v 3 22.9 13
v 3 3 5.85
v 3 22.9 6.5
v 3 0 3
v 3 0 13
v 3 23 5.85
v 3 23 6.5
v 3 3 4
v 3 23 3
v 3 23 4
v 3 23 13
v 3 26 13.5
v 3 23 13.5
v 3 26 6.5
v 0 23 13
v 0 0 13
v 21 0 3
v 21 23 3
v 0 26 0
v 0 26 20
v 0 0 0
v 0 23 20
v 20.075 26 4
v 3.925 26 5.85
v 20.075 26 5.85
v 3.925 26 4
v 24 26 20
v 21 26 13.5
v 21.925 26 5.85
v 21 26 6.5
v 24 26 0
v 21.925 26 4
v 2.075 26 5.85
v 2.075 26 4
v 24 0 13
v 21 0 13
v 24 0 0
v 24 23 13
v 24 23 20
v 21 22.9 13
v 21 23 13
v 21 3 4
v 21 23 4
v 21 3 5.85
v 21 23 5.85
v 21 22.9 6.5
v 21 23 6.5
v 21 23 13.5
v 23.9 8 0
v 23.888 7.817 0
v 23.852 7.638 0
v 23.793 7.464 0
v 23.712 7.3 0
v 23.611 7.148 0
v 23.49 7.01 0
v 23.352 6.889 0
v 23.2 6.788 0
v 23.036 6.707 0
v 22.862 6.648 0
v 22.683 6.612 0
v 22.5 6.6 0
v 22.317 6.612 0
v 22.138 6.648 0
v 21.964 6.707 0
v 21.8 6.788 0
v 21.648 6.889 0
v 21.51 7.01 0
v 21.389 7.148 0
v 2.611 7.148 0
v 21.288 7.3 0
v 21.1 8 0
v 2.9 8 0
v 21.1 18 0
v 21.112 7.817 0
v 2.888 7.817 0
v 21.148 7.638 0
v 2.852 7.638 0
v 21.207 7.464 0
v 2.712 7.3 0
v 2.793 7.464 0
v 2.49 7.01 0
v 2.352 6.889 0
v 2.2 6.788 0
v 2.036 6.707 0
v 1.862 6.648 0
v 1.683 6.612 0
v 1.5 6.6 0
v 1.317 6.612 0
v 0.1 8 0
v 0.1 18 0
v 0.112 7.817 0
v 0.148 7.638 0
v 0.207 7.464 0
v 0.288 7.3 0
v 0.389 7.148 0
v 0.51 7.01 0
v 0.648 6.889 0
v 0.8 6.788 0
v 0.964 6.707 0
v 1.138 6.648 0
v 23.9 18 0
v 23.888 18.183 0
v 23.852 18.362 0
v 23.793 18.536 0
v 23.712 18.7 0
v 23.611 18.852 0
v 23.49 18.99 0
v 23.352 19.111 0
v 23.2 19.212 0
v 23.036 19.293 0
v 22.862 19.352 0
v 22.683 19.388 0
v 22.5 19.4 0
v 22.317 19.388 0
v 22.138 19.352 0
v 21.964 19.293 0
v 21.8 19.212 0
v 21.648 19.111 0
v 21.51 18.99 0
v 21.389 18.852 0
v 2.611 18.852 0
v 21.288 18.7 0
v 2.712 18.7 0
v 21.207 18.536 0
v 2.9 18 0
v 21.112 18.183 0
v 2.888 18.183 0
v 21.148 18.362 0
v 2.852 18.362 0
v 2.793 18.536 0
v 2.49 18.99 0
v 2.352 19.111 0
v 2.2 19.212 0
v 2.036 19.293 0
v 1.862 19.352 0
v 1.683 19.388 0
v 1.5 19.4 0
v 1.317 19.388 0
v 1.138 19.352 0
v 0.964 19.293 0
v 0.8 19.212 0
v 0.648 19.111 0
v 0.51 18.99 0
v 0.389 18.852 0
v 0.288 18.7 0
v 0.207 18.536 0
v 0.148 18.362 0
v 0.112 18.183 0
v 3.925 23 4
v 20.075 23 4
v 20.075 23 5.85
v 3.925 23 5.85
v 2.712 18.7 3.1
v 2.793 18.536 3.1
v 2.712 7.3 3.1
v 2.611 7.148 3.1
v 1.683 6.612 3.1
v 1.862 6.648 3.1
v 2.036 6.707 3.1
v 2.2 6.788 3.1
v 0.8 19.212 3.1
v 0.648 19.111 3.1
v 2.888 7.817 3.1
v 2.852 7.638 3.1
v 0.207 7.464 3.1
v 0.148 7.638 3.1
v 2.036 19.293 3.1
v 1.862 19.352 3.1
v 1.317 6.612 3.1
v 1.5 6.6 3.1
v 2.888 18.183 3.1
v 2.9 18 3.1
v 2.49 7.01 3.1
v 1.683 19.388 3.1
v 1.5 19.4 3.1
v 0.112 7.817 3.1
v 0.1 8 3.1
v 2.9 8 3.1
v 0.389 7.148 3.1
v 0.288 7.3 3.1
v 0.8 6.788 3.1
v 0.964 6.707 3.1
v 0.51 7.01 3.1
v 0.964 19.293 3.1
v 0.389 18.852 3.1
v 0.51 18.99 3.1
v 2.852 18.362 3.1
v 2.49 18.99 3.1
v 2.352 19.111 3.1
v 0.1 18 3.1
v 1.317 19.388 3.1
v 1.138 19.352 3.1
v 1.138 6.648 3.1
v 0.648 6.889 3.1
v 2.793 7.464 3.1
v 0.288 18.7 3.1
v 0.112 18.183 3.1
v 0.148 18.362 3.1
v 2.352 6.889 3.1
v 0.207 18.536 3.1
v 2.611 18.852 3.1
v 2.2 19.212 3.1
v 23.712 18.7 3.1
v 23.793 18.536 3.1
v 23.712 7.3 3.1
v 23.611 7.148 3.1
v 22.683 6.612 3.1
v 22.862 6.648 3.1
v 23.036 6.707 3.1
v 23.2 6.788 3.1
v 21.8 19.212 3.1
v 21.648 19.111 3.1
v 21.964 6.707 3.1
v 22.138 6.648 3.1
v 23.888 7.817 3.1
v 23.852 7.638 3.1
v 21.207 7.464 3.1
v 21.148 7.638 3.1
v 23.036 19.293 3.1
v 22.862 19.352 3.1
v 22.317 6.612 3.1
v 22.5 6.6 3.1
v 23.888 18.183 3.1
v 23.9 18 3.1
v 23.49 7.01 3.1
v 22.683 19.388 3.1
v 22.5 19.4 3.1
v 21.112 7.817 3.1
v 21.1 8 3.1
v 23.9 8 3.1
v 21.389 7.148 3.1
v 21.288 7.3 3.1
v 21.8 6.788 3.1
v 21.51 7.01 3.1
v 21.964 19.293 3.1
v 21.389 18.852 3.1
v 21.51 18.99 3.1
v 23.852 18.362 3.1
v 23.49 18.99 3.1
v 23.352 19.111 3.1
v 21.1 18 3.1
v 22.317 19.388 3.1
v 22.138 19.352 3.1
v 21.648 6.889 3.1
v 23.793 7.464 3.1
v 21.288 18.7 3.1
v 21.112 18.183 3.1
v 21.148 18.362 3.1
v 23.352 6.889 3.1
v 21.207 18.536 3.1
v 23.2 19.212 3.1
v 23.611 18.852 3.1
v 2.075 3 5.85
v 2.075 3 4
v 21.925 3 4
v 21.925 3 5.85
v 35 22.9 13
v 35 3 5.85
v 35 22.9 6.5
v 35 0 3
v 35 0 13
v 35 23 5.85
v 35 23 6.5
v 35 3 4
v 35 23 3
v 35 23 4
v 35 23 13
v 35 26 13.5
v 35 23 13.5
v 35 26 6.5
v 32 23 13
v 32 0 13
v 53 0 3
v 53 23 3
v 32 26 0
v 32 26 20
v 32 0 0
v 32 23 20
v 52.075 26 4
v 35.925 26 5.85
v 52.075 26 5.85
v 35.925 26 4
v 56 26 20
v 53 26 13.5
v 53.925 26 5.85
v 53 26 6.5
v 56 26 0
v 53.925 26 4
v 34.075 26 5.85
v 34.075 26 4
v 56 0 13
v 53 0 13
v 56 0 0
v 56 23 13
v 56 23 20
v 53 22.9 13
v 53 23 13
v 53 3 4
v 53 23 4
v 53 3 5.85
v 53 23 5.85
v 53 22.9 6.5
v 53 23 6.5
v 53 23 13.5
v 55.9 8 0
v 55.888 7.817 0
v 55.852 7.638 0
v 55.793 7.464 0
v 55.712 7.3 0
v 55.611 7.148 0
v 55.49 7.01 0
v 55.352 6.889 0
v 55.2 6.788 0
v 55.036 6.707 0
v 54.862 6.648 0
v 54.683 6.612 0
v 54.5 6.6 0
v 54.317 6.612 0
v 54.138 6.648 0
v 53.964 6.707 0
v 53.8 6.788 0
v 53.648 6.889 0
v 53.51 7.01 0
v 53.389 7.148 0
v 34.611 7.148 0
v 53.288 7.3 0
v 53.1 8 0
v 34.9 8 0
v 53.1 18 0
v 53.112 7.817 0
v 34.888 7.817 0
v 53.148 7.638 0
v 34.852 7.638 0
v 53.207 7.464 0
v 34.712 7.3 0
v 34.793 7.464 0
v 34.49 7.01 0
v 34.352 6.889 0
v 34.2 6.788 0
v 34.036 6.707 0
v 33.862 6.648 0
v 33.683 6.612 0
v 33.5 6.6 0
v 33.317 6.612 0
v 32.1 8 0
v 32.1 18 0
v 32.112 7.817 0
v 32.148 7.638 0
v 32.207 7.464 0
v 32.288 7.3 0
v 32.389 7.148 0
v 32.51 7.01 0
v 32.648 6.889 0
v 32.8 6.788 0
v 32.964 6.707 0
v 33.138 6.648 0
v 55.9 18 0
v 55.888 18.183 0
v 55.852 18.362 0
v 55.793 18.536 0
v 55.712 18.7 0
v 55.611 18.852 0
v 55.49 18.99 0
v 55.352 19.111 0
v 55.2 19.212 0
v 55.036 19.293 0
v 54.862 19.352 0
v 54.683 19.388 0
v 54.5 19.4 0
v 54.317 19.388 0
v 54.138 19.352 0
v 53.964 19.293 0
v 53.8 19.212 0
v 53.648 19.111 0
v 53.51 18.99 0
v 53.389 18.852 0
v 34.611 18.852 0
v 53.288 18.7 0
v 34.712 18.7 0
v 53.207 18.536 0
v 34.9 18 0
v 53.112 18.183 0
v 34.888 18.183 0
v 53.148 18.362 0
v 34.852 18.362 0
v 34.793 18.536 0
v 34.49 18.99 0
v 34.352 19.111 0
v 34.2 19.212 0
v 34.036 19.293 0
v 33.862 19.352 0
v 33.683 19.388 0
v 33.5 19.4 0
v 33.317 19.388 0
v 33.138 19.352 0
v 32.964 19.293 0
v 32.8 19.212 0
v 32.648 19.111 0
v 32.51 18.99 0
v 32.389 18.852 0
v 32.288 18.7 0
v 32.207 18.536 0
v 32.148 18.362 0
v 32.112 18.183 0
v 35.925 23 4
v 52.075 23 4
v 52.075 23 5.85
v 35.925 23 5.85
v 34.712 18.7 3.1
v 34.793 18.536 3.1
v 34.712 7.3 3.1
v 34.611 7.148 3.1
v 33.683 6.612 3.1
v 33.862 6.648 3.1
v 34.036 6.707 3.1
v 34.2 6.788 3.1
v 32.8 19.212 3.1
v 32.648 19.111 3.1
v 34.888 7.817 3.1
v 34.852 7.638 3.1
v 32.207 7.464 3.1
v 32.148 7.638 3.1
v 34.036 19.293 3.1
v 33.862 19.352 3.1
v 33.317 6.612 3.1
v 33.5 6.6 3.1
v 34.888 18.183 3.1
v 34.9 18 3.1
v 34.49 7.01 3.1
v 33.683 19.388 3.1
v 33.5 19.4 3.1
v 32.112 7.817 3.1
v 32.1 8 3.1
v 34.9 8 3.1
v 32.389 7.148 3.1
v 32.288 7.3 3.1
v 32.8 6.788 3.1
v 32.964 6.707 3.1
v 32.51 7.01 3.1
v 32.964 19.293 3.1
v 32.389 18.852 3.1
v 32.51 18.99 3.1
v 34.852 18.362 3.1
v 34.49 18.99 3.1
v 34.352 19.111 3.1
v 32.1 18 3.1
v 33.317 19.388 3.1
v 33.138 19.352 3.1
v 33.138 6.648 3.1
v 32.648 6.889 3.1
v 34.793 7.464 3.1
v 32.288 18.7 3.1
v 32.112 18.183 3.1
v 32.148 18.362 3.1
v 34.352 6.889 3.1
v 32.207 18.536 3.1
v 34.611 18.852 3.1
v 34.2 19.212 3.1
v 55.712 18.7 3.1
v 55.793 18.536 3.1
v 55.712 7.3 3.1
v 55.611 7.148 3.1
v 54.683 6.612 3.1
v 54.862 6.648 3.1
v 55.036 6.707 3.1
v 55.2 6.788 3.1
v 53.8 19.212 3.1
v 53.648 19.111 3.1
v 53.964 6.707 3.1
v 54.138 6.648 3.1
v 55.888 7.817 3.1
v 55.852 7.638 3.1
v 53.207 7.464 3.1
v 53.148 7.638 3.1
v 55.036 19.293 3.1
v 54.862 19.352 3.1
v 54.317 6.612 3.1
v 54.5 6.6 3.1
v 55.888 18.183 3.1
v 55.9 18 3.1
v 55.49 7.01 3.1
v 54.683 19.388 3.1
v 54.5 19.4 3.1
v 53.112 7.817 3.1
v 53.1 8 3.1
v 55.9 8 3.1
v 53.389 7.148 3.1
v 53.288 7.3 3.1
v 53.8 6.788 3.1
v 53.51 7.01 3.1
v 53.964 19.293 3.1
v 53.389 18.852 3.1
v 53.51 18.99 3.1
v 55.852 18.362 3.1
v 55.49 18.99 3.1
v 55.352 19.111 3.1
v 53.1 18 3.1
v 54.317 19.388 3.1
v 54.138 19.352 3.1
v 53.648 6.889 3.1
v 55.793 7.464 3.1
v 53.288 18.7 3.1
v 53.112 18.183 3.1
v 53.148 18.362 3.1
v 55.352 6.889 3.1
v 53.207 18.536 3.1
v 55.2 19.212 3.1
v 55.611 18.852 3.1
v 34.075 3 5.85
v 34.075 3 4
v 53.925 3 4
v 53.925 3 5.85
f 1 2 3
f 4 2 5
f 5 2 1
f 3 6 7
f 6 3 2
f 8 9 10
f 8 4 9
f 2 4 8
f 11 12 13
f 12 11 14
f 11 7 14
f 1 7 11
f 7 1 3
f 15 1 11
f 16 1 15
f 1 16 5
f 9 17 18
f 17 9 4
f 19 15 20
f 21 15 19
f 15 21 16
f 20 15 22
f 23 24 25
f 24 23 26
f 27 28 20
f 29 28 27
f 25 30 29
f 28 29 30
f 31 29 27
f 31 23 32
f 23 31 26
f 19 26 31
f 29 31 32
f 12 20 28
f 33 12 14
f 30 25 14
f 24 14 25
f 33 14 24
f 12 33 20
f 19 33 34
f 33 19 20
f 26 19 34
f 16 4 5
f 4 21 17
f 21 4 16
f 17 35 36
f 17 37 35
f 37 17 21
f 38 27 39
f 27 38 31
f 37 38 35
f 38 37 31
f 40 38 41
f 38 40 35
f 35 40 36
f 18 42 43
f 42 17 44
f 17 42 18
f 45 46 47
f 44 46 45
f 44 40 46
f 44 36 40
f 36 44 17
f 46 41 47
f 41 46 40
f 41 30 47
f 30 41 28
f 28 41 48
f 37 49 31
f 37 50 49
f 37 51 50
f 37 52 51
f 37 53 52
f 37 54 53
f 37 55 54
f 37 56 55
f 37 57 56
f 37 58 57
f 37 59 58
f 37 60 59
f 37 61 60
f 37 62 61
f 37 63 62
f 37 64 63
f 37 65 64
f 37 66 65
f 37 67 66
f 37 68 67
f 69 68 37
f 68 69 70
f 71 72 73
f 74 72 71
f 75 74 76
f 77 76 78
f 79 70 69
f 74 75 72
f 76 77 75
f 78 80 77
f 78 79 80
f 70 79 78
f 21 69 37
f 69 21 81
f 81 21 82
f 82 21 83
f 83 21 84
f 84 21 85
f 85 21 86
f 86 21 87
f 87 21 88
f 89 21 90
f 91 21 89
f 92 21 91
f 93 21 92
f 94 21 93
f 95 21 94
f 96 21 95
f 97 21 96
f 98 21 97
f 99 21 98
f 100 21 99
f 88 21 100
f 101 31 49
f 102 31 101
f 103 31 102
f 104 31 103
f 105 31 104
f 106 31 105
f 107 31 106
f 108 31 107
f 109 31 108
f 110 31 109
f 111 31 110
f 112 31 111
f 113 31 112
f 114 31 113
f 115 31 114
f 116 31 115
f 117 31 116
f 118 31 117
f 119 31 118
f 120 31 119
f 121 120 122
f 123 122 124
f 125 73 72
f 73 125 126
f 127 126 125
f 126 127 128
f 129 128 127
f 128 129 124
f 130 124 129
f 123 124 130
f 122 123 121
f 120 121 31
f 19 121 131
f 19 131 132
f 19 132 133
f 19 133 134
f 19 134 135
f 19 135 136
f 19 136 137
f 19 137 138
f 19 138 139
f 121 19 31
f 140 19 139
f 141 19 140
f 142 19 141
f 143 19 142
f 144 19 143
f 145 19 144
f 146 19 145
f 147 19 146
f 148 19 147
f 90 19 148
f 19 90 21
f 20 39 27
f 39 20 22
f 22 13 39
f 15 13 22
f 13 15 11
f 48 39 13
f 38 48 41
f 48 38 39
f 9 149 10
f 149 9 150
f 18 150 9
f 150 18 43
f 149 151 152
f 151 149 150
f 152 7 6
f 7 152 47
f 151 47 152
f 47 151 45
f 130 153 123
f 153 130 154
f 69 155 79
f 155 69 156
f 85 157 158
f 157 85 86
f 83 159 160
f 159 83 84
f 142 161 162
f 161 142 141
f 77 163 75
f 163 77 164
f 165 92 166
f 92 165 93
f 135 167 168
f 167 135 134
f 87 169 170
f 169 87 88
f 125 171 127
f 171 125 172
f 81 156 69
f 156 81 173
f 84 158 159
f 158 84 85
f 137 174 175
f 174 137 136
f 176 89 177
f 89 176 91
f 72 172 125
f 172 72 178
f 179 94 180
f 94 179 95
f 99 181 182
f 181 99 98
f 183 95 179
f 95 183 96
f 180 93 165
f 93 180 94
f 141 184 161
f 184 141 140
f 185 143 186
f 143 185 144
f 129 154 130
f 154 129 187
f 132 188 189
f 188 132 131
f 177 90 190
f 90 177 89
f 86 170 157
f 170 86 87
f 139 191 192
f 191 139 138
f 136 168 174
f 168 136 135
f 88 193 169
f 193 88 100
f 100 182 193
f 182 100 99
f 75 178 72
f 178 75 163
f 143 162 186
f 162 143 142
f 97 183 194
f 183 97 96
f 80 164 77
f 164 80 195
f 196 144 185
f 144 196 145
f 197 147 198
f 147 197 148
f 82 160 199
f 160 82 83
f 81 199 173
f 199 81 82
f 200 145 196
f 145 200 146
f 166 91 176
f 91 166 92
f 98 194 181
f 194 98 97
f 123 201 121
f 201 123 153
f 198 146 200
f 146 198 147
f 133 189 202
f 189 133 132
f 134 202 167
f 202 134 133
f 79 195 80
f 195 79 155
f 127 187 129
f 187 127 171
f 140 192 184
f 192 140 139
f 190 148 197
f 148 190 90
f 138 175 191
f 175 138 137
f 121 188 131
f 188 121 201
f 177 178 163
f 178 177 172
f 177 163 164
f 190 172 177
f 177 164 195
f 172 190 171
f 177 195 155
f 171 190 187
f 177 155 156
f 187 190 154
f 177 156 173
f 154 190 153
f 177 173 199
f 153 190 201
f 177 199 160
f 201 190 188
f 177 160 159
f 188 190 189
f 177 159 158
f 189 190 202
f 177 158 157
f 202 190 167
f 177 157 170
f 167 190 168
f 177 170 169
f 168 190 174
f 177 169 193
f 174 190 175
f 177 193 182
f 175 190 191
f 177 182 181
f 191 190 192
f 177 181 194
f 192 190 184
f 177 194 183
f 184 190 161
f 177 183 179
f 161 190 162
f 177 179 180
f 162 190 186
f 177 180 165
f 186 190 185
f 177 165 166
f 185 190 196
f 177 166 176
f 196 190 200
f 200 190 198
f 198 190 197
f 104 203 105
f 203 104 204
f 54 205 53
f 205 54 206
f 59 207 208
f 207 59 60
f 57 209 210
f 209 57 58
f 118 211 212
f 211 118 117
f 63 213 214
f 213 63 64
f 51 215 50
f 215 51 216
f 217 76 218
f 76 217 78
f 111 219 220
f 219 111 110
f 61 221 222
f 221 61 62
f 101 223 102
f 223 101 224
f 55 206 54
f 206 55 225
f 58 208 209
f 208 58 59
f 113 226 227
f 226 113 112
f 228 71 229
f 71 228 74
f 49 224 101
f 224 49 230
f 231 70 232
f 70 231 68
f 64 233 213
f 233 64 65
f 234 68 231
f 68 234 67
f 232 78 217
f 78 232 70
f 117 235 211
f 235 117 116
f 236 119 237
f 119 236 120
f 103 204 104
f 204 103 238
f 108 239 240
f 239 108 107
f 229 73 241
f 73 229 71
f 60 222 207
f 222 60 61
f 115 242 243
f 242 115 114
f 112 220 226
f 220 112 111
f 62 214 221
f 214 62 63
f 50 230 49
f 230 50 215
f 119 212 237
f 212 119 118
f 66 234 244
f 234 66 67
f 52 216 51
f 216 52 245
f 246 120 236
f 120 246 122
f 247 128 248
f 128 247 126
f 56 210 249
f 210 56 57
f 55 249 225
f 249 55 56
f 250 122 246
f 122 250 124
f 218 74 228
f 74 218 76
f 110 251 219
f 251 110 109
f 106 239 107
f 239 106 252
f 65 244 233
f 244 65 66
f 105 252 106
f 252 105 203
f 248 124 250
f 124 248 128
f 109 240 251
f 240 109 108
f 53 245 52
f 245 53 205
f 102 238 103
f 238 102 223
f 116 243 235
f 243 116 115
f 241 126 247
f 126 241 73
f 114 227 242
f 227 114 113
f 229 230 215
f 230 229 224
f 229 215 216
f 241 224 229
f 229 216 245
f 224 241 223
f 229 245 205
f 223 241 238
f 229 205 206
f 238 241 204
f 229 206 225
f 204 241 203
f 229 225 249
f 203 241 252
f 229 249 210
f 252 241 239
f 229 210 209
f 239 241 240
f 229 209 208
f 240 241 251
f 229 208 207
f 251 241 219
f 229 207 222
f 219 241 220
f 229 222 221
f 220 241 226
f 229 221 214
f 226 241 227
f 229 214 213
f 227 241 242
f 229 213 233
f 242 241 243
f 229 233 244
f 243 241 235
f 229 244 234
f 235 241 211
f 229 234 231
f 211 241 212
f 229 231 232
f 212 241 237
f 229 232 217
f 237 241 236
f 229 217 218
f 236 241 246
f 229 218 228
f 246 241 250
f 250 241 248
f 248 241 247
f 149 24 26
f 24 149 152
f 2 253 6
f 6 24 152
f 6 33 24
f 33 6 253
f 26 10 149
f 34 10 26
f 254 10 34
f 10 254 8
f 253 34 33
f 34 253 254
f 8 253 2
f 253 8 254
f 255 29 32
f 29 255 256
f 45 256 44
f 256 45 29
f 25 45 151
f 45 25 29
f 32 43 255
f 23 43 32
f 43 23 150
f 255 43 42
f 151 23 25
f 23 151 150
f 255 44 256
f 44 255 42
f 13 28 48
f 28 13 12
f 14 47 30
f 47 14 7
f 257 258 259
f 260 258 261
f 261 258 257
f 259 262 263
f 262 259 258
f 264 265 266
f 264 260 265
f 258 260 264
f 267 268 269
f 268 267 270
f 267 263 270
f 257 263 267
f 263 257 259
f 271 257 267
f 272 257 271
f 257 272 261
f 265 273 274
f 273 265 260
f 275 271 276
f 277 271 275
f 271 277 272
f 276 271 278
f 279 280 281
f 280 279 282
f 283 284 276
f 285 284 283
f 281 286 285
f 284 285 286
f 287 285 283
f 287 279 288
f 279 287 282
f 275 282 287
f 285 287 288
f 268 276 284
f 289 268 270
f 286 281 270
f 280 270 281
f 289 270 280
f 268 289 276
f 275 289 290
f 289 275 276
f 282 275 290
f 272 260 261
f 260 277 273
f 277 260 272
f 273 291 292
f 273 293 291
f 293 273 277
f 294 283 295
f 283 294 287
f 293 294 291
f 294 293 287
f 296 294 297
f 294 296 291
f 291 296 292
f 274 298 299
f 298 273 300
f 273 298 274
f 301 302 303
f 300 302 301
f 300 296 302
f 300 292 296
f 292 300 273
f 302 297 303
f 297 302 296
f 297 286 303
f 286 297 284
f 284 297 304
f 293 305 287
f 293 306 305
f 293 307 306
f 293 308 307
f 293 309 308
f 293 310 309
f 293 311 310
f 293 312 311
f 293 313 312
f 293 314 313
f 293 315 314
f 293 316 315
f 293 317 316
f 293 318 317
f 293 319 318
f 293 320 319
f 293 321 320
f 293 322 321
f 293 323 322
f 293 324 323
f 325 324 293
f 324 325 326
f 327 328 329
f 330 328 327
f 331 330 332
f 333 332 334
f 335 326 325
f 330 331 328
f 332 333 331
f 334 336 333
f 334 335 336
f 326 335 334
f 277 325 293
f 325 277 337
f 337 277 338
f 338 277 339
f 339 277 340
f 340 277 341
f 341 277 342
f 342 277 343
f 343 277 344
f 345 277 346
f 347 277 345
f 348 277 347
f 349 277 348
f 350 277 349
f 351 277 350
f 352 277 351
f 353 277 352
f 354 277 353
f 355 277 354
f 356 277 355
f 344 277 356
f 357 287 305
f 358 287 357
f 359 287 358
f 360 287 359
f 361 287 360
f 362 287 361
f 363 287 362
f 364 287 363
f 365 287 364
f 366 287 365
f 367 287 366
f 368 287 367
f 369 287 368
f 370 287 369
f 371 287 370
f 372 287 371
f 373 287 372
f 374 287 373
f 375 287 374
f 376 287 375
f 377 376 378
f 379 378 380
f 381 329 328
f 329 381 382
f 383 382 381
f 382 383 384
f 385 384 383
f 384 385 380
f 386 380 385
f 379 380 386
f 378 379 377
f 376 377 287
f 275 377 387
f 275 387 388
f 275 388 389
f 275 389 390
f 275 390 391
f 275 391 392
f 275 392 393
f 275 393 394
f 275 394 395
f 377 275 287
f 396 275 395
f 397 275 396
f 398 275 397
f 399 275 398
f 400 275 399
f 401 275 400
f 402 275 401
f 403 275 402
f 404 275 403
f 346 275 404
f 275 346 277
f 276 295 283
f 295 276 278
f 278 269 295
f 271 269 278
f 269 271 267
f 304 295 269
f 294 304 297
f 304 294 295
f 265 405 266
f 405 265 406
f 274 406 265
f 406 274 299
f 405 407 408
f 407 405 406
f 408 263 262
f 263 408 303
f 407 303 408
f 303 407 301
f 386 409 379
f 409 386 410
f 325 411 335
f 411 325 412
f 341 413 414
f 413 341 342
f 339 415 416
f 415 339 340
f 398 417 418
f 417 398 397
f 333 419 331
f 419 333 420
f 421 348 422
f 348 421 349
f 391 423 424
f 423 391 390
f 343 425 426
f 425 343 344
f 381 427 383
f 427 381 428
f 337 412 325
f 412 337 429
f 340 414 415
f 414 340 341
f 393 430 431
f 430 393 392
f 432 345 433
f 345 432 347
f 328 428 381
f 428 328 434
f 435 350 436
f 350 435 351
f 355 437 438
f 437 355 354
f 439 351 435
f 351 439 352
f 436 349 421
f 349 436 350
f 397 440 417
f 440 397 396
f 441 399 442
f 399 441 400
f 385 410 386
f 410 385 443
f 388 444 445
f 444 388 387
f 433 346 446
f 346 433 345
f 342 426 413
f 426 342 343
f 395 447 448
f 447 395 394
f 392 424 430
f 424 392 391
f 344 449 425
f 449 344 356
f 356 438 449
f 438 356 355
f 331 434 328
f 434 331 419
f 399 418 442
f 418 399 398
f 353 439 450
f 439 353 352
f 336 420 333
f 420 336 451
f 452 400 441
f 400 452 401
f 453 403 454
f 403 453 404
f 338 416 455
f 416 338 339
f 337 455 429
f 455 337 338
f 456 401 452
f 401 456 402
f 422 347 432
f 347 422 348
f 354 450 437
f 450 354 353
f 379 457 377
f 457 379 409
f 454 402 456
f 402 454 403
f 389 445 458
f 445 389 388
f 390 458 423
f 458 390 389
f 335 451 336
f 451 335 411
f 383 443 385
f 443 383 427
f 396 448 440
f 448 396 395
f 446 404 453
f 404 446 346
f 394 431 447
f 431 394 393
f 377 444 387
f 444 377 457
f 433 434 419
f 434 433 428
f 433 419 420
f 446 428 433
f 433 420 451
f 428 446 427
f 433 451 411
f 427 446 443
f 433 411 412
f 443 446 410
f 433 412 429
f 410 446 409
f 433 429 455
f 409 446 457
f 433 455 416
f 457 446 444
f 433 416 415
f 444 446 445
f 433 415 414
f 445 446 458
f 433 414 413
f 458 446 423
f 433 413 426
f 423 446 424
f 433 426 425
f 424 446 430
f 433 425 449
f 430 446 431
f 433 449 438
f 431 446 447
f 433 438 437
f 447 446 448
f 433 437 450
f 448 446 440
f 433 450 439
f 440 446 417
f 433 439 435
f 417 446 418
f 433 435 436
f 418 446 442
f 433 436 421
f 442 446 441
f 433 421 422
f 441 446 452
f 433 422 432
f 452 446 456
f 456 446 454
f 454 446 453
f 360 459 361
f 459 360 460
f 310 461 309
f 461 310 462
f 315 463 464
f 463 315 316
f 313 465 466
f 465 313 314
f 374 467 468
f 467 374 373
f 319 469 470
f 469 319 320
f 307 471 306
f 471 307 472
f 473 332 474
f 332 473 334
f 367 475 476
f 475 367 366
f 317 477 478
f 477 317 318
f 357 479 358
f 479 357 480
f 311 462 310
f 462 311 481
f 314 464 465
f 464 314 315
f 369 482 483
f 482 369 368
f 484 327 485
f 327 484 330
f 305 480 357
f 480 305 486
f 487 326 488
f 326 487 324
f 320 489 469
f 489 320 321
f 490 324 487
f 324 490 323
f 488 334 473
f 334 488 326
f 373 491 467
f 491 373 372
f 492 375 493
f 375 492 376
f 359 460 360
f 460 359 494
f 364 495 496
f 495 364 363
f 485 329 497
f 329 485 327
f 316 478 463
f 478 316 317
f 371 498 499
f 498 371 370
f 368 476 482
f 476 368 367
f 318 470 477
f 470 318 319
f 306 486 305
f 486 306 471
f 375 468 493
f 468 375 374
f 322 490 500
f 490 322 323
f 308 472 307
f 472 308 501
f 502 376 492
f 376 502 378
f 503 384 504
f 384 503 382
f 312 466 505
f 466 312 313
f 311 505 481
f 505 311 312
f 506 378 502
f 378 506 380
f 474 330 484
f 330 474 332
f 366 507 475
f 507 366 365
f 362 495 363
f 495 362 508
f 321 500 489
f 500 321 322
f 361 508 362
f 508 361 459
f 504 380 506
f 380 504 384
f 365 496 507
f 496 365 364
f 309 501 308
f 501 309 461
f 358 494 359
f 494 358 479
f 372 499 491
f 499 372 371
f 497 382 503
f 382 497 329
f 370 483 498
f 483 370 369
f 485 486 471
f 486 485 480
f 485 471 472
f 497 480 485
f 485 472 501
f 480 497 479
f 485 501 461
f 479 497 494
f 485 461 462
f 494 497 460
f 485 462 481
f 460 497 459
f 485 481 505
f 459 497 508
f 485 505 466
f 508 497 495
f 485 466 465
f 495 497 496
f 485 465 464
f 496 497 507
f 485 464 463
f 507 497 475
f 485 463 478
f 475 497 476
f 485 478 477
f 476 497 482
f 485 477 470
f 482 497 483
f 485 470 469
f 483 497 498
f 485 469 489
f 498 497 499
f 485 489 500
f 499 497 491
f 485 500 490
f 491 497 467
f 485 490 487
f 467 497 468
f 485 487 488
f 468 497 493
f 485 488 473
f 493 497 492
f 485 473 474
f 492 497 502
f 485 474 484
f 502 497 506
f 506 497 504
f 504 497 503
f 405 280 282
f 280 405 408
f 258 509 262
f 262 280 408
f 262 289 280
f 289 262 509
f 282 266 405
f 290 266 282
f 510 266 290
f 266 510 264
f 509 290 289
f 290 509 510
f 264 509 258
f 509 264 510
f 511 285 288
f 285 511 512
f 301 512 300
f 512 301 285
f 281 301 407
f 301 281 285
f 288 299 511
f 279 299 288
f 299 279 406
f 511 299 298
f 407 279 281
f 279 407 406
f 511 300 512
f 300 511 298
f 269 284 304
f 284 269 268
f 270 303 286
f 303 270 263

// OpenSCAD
// file: ../common/tile_dimensions.scad
// Shared grid and preliminary PCB contract. See docs/specifications/interfaces.md.
tile_size = 80;
tile_height = 20;
pcb_mount_spacing = 30;
pcb_mount_height = 9;
pcb_preview_size = 68;
pcb_preview_thickness = 1.6;
pcb_preview_hole_diameter = 2.5;
mount_spacing = 24;
// main file
// Adjustable unpowered fit coupon. Slots are not a manufacturer connector model.
include <../common/tile_dimensions.scad>
$fn = 48;

pcb_thickness = pcb_preview_thickness;
slot_clearance = 0.25;
rail_length = 26;
board_width = 18;
base_thickness = 3;
wall = 3;
connector_axis_height = 10;
connector_window_width = 18;
connector_window_height = 7;
board_setback = 3;
slot_travel = 10;
separation = 8;
show_boards = true;

assert(pcb_thickness > 0 && slot_clearance > 0);
assert(connector_axis_height > base_thickness);
assert(board_setback >= 0);

module coupon() {
    difference() {
        union() {
            cube([board_width + 2*wall, rail_length, base_thickness]);
            for (x = [0, board_width + wall])
                translate([x, 0, base_thickness])
                    cube([wall, rail_length, connector_axis_height]);
            translate([0, rail_length-wall, 0])
                cube([board_width + 2*wall, wall, tile_height]);
        }
        for (x = [wall/2, board_width + 1.5*wall])
            translate([x, rail_length/2, -0.1])
                hull() {
                    translate([0, -slot_travel/2, 0]) cylinder(d=2.8, h=base_thickness+0.2);
                    translate([0, slot_travel/2, 0]) cylinder(d=2.8, h=base_thickness+0.2);
                }
        translate([(board_width + 2*wall-connector_window_width)/2,
                   rail_length-wall-0.1, connector_axis_height-connector_window_height/2])
            cube([connector_window_width, wall+0.2, connector_window_height]);
        for (x = [wall-pcb_thickness/2, board_width+wall-pcb_thickness/2])
            translate([x-slot_clearance/2, board_setback, base_thickness+1])
                cube([pcb_thickness+slot_clearance, rail_length, pcb_thickness+slot_clearance]);
    }
}

coupon();
translate([board_width+2*wall+separation, 0, 0]) coupon();

if ($preview && show_boards)
    for (x = [wall, board_width + 3*wall + separation])
        color([0,0.6,0.2,0.5])
            translate([x, board_setback, base_thickness+1])
                cube([board_width, rail_length-board_setback-wall, pcb_thickness]);
